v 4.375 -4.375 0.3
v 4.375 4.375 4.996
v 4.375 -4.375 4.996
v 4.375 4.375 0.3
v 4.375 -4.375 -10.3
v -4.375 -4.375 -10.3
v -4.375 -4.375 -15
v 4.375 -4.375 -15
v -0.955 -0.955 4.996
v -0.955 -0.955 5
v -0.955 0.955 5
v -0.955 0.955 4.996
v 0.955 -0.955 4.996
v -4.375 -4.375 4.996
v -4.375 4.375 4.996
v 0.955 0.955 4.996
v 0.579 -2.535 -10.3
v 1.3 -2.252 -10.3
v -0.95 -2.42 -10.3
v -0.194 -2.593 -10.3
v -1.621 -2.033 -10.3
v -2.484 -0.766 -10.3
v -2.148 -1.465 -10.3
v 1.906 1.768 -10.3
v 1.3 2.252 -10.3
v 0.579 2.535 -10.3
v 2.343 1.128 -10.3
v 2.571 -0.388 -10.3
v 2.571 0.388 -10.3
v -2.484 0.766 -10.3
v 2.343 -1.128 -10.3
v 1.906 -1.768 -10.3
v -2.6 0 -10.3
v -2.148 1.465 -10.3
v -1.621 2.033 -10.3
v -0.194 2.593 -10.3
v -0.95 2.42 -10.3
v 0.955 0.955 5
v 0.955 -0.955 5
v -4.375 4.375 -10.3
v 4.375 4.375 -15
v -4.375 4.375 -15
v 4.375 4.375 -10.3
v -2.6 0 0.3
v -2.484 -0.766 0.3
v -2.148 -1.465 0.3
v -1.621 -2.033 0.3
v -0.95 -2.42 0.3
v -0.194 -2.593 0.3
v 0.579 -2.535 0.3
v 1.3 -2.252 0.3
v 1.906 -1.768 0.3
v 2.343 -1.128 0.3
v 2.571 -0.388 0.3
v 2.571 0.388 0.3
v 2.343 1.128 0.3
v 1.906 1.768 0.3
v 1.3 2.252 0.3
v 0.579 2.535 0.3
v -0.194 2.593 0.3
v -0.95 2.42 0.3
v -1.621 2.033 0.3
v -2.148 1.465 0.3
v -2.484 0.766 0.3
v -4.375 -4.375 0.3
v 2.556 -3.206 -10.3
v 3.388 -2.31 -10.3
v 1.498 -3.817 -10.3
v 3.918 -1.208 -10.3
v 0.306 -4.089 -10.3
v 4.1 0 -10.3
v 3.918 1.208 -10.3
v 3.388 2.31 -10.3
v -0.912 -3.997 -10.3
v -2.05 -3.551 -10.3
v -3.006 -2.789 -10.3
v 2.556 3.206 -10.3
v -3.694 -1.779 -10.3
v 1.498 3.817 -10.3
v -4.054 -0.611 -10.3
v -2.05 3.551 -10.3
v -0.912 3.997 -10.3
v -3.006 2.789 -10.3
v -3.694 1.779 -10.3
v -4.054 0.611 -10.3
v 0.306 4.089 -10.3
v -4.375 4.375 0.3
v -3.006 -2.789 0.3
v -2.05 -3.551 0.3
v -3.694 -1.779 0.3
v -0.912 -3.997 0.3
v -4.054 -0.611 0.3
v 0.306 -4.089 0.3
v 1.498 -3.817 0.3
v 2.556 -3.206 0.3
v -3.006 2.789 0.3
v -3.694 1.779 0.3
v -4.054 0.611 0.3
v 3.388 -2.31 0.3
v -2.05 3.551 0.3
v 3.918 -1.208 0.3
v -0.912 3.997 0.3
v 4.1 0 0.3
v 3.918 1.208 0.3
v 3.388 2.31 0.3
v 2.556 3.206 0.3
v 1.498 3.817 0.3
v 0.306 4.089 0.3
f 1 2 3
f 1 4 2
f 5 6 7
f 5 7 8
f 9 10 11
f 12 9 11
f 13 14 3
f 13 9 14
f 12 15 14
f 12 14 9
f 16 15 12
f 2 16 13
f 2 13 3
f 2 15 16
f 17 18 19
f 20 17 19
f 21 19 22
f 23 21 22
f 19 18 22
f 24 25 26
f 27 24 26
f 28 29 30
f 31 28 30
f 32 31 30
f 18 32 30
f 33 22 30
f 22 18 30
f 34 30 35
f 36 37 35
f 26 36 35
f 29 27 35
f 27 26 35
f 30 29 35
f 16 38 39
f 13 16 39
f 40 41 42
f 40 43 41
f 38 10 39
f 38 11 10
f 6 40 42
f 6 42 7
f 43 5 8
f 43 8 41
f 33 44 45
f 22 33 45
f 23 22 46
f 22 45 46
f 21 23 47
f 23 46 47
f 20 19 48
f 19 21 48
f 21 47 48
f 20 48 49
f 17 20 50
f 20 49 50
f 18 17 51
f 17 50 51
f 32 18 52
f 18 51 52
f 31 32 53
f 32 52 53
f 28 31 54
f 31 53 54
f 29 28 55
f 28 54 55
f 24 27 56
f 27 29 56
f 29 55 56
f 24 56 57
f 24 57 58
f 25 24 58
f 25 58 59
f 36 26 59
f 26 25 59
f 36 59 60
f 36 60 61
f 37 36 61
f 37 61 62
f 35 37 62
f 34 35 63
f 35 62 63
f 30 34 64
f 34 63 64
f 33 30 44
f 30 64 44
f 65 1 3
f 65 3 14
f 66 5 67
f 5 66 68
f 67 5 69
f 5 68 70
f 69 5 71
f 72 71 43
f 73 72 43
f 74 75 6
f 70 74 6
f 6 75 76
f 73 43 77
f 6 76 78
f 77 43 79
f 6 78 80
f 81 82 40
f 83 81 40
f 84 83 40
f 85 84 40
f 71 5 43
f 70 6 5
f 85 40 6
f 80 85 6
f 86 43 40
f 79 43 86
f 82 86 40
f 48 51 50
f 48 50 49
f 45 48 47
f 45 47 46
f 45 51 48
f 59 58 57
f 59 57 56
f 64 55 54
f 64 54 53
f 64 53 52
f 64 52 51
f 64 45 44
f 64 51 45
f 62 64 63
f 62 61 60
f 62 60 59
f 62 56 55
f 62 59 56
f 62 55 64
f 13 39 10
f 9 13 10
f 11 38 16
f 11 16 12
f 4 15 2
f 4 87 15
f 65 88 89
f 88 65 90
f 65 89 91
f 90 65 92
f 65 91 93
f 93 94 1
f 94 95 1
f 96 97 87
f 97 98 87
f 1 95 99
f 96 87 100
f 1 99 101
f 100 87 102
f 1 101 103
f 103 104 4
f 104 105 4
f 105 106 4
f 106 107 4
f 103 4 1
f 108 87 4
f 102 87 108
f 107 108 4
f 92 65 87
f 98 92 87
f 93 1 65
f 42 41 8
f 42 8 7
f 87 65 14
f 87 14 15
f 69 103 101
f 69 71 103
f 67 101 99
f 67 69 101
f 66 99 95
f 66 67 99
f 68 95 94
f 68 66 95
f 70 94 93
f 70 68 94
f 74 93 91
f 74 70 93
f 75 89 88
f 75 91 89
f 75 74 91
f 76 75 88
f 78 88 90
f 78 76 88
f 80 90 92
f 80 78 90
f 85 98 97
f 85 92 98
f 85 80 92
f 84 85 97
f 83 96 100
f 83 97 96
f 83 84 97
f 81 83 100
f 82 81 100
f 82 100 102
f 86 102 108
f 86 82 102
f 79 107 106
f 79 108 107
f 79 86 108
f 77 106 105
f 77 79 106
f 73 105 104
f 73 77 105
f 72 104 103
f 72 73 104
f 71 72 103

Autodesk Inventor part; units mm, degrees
ref_plane "YZ Plane" through (0, 0, 0) normal (1, 0, 0) x (0, 1, 0)
ref_plane "XZ Plane" through (0, 0, 0) normal (0, 1, 0) x (-1, 0, 0)
ref_plane "XY Plane" through (0, 0, 0) normal (0, 0, 1) x (1, 0, 0)
sketch "Sketch1" plane through (0, 0, 0) normal (0, 0, 1) x (1, 0, 0)
  circle A0 centre (0, 0) radius 1.65 projected
  circle A1 centre (0, 0) radius 1.35
  point P0 (0, 0)
  dimension "d21" = 2.7
extrude "Extrusion1" add sketch "Sketch1" along normal blind 5 and the other way blind 15 contours A1
sketch "Sketch2" plane through (0, 0, 5) normal (0, 0, 1) x (1, 0, 0)
  circle A0 centre (0, 0) radius 1.35 projected
  line L0 (-0.9546, 0.9546) -> (0.9546, 0.9546)
  line L1 (0.9546, 0.9546) -> (0.9546, -0.9546)
  line L2 (0.9546, -0.9546) -> (-0.9546, -0.9546)
  line L3 (-0.9546, -0.9546) -> (-0.9546, 0.9546)
  circle A1 centre (0, 0) radius 1.35 projected
  point P0 (0, 0)
extrude "Extrusion2" cut sketch "Sketch2" against normal blind 2 contours A0 L1 | L0 A0 | A0 L2 | L3 A0
sketch "Sketch3" plane through (0, 0, 3) normal (0, 0, 1) x (1, 0, 0)
  arc A0 (-0.9546, 0.9546) -> (-0.9546, -0.9546) centre (0, 0) ccw projected
  arc A1 (0.9546, 0.9546) -> (-0.9546, 0.9546) centre (0, 0) ccw projected
  arc A2 (0.9546, -0.9546) -> (0.9546, 0.9546) centre (0, 0) ccw projected
  arc A3 (-0.9546, -0.9546) -> (0.9546, -0.9546) centre (0, 0) ccw projected
  arc A4 (-0.9546, 0.9546) -> (-0.9546, -0.9546) centre (0, 0) ccw projected
  circle A5 centre (0, 0) radius 1.35 projected
  circle A6 centre (0, 0) radius 1.9092
  point P0 (0, 0)
extrude "Extrusion3" add sketch "Sketch3" against normal blind 2.7
sketch "Sketch4" plane through (0, 0, -15) normal (0, 0, -1) x (-1, 0, 0)
  circle A0 centre (0, 0) radius 1.35 projected
  circle A1 centre (0, 0) radius 1.35 projected
  circle A2 centre (0, 0) radius 1.9092 projected
  line L0 (-0.9546, -0.9546) -> (-0.9546, 0.9546) projected
  line L1 (0.9546, -0.9546) -> (-0.9546, -0.9546) projected
  line L2 (0.9546, 0.9546) -> (0.9546, -0.9546) projected
  line L3 (-0.9546, 0.9546) -> (0.9546, 0.9546) projected
extrude "Extrusion4" cut sketch "Sketch4" against normal blind 2 contours A0 L2 | L3 A0 | A0 L1 | L0 A0
sketch "Sketch5" plane through (0, 0, -13) normal (0, 0, -1) x (-1, 0, 0)
  circle A0 centre (0, 0) radius 1.9092 projected
  point P0 (0, 0)
extrude "Extrusion5" add sketch "Sketch5" against normal blind 2.7
sketch "Sketch7" plane through (-0.9546, -0.9546, -15) normal (0, -1, 0) x (1, 0, 0)
  line L0 (1.9092, 2) -> (0, 2) construction
  line L1 (0, 0) -> (0, 2) construction
  line L2 (1.9092, 2) -> (1.9092, 0) construction
  line L3 (-1.4999, 2) -> (3.4091, 2)
  line L4 (3.4091, 2) -> (3.4091, 0)
  line L5 (3.4091, 0) -> (-1.4999, 0)
  line L6 (-1.4999, 0) -> (-1.4999, 2)
  line L7 (0.9546, 19.9961) -> (0.9546, 0)
  line L8 (0.9546, 9.998) -> (8.9961, 9.998)
  line L9 (-1.4999, 17.9961) -> (3.4091, 17.9961)
  line L10 (3.4091, 17.9961) -> (3.4091, 19.9961)
  line L11 (3.4091, 19.9961) -> (-1.4999, 19.9961)
  line L12 (-1.4999, 19.9961) -> (-1.4999, 17.9961)
  point P0 (0.9546, 15)
  dimension "d13" = 4.909
  dimension "d14" = 1.4999
  dimension "d15" = 1.9092
  dimension "d16" = 2
  dimension "d17" = 2
  dimension "d18" = 0
extrude "Extrusion6" add sketch "Sketch7" against normal up to surface (1.9092 mm away)
sketch "Sketch8" plane through (0, 0, -10.3) normal (0, 0, 1) x (1, 0, 0)
  circle A0 centre (0, 0) radius 1.35 projected
  circle A1 centre (0, 0) radius 3.375
  dimension "d22" = 2.7
  dimension "d23" = 6.75
extrude "Extrusion7" add sketch "Sketch8" along normal up to surface (10.6 mm away)
sketch "Sketch9" plane through (0, 0, -10.3) normal (0, 0, -1) x (-1, 0, 0)
  circle A0 centre (0, 0) radius 3.375 projected
  circle A1 centre (0, 0) radius 1.9092 projected
  circle A2 centre (0, 0) radius 4.375
  dimension "d26" = 1
extrude "Extrusion8" add sketch "Sketch9" along normal up to surface (2.7 mm away) contours A0 | A2
sketch "Sketch10" plane through (0, 0, 0.3) normal (0, 0, 1) x (1, 0, 0)
  circle A0 centre (0, 0) radius 1.9092 projected
  circle A1 centre (0, 0) radius 4.375 projected
extrude "Extrusion9" add sketch "Sketch10" along normal up to surface (2.7 mm away)
sketch "Sketch12" plane through (0, 0, 3) normal (0, 0, 1) x (1, 0, 0)
  circle A0 centre (0, 0) radius 4.375 projected
  line L0 (2.4545, -0.9546) -> (-2.4545, -0.9546) projected
  line L1 (-2.4545, 0.9546) -> (-2.4545, -0.9546) projected
  line L2 (2.4545, 0.9546) -> (-2.4545, 0.9546) projected
  line L3 (2.4545, -0.9546) -> (2.4545, 0.9546) projected
extrude "Extrusion11" cut sketch "Sketch12" against normal blind 0.3
sketch "Sketch13" plane through (0, 0, -13) normal (0, 0, -1) x (-1, 0, 0)
  circle A0 centre (0, 0) radius 4.375 projected
  line L0 (-2.4545, 0.9546) -> (2.4545, 0.9546) projected
  line L1 (2.4545, -0.9546) -> (2.4545, 0.9546) projected
  line L2 (-2.4545, -0.9546) -> (2.4545, -0.9546) projected
  line L3 (-2.4545, -0.9546) -> (-2.4545, 0.9546) projected
extrude "Extrusion12" cut sketch "Sketch13" against normal blind 0.3
sketch "Sketch14" plane through (0, 0, -10.3) normal (0, 0, 1) x (1, 0, 0)
  circle A0 centre (0, 0) radius 3.375 projected
  circle A1 centre (0, 0) radius 4.1
  dimension "d37" = 8.2
extrude "Extrusion13" add sketch "Sketch14" along normal up to surface (10.6 mm away)
sketch "Sketch15" plane through (0, 0, -12.7) normal (0, 0, -1) x (-1, 0, 0)
  circle A0 centre (0, 0) radius 4.375 projected
  line L0 (-4.375, 4.375) -> (4.375, 4.375)
  line L1 (4.375, 4.375) -> (4.375, -4.375)
  line L2 (4.375, -4.375) -> (-4.375, -4.375)
  line L3 (-4.375, -4.375) -> (-4.375, 4.375)
  dimension "d40" = 8.75
  dimension "d41" = 8.75
  dimension "d42" = 8.75
extrude "Extrusion14" add sketch "Sketch15" against normal up to surface (2.4 mm away) contours L1 L2 A0 | A0 L0 L1 | A0 L3 L0 | L2 L3 A0
sketch "Sketch16" plane through (0, 0, 2.7) normal (0, 0, 1) x (1, 0, 0)
  circle A0 centre (0, 0) radius 4.375 projected
  line L0 (2.4545, 0.9546) -> (2.4545, -0.9546) projected
  line L1 (-2.4545, 0.9546) -> (2.4545, 0.9546) projected
  line L2 (-2.4545, -0.9546) -> (-2.4545, 0.9546) projected
  line L3 (2.4545, -0.9546) -> (-2.4545, -0.9546) projected
  line L4 (-4.375, 4.375) -> (-4.375, -4.375) projected
  line L5 (4.375, 4.375) -> (-4.375, 4.375) projected
  line L6 (4.375, -4.375) -> (4.375, 4.375) projected
  line L7 (-4.375, -4.375) -> (4.375, -4.375) projected
extrude "Extrusion15" add sketch "Sketch16" against normal up to surface (2.4 mm away) contours L6 L7 A0 | A0 L5 L6 | A0 L4 L5 | L7 L4 A0
sketch "Sketch17" plane through (0, 0, 2.7) normal (0, 0, 1) x (1, 0, 0)
  line L0 (2.4545, -0.9546) -> (2.4545, 0.9546) projected
  line L1 (-2.4545, -0.9546) -> (2.4545, -0.9546) projected
  line L2 (-2.4545, 0.9546) -> (-2.4545, -0.9546) projected
  line L3 (2.4545, 0.9546) -> (-2.4545, 0.9546) projected
  line L4 (-4.375, 4.375) -> (4.375, 4.375) projected
  line L5 (-4.375, -4.375) -> (-4.375, 4.375) projected
  line L6 (4.375, -4.375) -> (-4.375, -4.375) projected
  line L7 (4.375, 4.375) -> (4.375, -4.375) projected
  point P0 (0, 0)
extrude "Extrusion16" add sketch "Sketch17" along normal up to surface (2.2961 mm away)
sketch "Sketch18" plane through (0, 0, -12.7) normal (0, 0, -1) x (-1, 0, 0)
  line L0 (-2.4545, 0.9546) -> (-2.4545, -0.9546) projected
  line L1 (2.4545, 0.9546) -> (-2.4545, 0.9546) projected
  line L2 (2.4545, -0.9546) -> (2.4545, 0.9546) projected
  line L3 (-2.4545, -0.9546) -> (2.4545, -0.9546) projected
  line L4 (4.375, 4.375) -> (4.375, -4.375) projected
  line L5 (-4.375, 4.375) -> (4.375, 4.375) projected
  line L6 (-4.375, -4.375) -> (-4.375, 4.375) projected
  line L7 (4.375, -4.375) -> (-4.375, -4.375) projected
  point P0 (0, 0)
extrude "Extrusion17" add sketch "Sketch18" along normal up to surface (2.3 mm away)
sketch "Sketch19" plane through (0, 0, 0.3) normal (0, 0, -1) x (-1, 0, 0)
  circle A0 centre (0, 0) radius 4.1 projected
  circle A1 centre (0, 0) radius 2.6
  dimension "d51" = 1.5
extrude "Extrusion18" cut sketch "Sketch19" along normal up to surface (10.6 mm away) contours A1
equation "\"d14\" = -0.5 * d15 + 0.5 * d13"
equation "\"d23\" = 2.5 * d22"
equation "\"d41\" = d40"
equation "\"d42\" = d40"
properties part number "LargeSmallGearAxis"
